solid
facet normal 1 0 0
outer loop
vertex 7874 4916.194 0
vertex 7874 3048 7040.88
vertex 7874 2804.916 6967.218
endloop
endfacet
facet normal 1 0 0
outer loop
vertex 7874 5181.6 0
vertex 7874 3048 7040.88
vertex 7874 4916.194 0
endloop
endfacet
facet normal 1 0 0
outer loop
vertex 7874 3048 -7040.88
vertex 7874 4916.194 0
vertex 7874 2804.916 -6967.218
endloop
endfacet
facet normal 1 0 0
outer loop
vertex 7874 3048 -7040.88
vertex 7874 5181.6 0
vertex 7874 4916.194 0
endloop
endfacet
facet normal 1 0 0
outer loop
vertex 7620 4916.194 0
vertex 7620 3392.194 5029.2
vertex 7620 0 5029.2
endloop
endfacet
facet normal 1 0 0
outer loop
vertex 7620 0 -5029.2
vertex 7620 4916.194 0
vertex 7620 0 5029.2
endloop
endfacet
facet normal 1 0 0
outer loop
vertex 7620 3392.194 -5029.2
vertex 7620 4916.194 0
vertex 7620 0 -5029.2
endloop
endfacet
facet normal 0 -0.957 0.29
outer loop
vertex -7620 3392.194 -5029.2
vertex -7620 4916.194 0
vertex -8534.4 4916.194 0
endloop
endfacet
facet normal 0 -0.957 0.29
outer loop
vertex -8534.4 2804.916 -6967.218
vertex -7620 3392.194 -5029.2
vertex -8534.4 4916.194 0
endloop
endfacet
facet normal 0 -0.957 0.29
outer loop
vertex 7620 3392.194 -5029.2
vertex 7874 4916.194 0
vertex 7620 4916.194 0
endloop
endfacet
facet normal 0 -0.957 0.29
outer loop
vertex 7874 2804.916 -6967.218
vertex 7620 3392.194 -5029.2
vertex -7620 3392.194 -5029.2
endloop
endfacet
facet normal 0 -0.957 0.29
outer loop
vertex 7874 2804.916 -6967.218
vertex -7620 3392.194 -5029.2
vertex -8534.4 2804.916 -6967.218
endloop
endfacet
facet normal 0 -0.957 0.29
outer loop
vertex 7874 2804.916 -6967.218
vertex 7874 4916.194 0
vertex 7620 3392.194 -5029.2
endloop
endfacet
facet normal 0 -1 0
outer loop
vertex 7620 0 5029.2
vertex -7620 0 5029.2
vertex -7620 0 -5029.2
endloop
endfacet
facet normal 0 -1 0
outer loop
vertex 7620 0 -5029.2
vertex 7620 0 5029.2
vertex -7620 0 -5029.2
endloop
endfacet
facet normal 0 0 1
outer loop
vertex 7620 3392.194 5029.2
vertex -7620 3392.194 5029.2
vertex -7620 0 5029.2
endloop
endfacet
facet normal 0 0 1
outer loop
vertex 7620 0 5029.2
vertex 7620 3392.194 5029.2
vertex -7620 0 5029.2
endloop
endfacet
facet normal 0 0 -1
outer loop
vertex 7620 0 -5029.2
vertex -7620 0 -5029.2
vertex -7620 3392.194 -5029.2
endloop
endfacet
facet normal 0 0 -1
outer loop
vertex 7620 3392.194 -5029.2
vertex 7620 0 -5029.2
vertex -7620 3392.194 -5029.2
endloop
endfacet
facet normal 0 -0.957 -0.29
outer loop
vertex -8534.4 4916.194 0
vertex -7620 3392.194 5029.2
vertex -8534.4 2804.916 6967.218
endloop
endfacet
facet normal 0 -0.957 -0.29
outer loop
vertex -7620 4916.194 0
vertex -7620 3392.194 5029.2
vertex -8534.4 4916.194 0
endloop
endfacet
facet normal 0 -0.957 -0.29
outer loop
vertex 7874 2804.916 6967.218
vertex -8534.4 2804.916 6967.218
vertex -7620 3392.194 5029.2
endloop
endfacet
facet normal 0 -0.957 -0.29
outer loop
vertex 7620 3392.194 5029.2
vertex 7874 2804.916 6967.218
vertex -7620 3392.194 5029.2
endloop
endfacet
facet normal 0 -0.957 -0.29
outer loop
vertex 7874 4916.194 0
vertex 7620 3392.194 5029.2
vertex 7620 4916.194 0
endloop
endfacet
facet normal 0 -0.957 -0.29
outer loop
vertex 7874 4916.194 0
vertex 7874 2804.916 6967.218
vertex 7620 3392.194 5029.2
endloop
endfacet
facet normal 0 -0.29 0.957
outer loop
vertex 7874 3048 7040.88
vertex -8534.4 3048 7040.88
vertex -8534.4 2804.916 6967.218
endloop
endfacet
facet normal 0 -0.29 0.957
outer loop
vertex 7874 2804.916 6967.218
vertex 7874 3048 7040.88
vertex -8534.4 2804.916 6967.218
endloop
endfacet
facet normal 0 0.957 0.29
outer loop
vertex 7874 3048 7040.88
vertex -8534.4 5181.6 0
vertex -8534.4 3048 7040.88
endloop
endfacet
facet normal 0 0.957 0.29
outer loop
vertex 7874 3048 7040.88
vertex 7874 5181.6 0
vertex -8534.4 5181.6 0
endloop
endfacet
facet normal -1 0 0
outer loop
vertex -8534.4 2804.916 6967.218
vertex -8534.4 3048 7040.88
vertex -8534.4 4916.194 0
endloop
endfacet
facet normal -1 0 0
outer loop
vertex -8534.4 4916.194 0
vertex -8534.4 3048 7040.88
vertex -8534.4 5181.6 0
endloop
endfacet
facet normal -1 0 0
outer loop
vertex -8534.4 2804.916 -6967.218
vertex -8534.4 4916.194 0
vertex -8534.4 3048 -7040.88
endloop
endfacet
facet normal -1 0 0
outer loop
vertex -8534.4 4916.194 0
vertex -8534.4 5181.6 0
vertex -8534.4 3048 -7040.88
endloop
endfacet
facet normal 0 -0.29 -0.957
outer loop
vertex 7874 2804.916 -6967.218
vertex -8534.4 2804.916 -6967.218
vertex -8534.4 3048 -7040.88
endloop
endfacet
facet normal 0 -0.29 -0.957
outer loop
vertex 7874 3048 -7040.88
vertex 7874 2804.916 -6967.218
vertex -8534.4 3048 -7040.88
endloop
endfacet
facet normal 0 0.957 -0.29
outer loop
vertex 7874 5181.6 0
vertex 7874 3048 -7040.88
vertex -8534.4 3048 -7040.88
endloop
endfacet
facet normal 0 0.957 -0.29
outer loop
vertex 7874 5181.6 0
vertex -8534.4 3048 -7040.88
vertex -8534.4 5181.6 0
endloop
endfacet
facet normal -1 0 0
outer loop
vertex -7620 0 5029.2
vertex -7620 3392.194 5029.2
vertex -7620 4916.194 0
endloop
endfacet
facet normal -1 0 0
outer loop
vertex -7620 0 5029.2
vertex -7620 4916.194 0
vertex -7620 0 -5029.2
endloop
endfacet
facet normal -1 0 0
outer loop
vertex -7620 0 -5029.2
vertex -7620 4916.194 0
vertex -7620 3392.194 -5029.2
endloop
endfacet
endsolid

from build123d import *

# Parameters (mm, degrees)
BOSS_EXTRUDE1_DEPTH = 7620
BOSS_EXTRUDE2_START = 7620
BOSS_EXTRUDE2_DEPTH = 254
BOSS_EXTRUDE3_START = -7620
BOSS_EXTRUDE3_DEPTH = 914.4


with BuildPart() as part:
    # Sketch1 → Boss-Extrude1 (new body, symmetric)
    with BuildSketch(Plane(origin=(0, 0, 0), x_dir=(0, 0, -1), z_dir=(1, 0, 0))):
        Polygon((-5029.2, 0), (5029.2, 0), (5029.2, 3392.19401994), (6967.218121598, 2804.915801274), (7040.88, 3048), (5029.2, 3657.6), (0, 5181.6), (-5029.2, 3657.6), (-7040.88, 3048), (-6967.218121598, 2804.915801274), (-5029.2, 3392.19401994), align=None)
    extrude(amount=BOSS_EXTRUDE1_DEPTH, both=True)

    # Sketch2 → Boss-Extrude2 (add)
    with BuildSketch(Plane(origin=(0, 0, 0), x_dir=(0, 0, -1), z_dir=(1, 0, 0)).offset(BOSS_EXTRUDE2_START)):
        Polygon((-6967.218121598, 2804.915801274), (-5029.2, 3392.19401994), (0, 4916.19401994), (5029.2, 3392.19401994), (6967.218121598, 2804.915801274), (7040.88, 3048), (0, 5181.6), (-7040.88, 3048), align=None)
    extrude(amount=BOSS_EXTRUDE2_DEPTH)

    # Sketch2<2> → Boss-Extrude3 (add)
    with BuildSketch(Plane(origin=(0, 0, 0), x_dir=(0, 0, -1), z_dir=(1, 0, 0)).offset(BOSS_EXTRUDE3_START)):
        Polygon((-6967.218121598, 2804.915801274), (-5029.2, 3392.19401994), (0, 4916.19401994), (5029.2, 3392.19401994), (6967.218121598, 2804.915801274), (7040.88, 3048), (0, 5181.6), (-7040.88, 3048), align=None)
    extrude(amount=-BOSS_EXTRUDE3_DEPTH)


solid = part.part
